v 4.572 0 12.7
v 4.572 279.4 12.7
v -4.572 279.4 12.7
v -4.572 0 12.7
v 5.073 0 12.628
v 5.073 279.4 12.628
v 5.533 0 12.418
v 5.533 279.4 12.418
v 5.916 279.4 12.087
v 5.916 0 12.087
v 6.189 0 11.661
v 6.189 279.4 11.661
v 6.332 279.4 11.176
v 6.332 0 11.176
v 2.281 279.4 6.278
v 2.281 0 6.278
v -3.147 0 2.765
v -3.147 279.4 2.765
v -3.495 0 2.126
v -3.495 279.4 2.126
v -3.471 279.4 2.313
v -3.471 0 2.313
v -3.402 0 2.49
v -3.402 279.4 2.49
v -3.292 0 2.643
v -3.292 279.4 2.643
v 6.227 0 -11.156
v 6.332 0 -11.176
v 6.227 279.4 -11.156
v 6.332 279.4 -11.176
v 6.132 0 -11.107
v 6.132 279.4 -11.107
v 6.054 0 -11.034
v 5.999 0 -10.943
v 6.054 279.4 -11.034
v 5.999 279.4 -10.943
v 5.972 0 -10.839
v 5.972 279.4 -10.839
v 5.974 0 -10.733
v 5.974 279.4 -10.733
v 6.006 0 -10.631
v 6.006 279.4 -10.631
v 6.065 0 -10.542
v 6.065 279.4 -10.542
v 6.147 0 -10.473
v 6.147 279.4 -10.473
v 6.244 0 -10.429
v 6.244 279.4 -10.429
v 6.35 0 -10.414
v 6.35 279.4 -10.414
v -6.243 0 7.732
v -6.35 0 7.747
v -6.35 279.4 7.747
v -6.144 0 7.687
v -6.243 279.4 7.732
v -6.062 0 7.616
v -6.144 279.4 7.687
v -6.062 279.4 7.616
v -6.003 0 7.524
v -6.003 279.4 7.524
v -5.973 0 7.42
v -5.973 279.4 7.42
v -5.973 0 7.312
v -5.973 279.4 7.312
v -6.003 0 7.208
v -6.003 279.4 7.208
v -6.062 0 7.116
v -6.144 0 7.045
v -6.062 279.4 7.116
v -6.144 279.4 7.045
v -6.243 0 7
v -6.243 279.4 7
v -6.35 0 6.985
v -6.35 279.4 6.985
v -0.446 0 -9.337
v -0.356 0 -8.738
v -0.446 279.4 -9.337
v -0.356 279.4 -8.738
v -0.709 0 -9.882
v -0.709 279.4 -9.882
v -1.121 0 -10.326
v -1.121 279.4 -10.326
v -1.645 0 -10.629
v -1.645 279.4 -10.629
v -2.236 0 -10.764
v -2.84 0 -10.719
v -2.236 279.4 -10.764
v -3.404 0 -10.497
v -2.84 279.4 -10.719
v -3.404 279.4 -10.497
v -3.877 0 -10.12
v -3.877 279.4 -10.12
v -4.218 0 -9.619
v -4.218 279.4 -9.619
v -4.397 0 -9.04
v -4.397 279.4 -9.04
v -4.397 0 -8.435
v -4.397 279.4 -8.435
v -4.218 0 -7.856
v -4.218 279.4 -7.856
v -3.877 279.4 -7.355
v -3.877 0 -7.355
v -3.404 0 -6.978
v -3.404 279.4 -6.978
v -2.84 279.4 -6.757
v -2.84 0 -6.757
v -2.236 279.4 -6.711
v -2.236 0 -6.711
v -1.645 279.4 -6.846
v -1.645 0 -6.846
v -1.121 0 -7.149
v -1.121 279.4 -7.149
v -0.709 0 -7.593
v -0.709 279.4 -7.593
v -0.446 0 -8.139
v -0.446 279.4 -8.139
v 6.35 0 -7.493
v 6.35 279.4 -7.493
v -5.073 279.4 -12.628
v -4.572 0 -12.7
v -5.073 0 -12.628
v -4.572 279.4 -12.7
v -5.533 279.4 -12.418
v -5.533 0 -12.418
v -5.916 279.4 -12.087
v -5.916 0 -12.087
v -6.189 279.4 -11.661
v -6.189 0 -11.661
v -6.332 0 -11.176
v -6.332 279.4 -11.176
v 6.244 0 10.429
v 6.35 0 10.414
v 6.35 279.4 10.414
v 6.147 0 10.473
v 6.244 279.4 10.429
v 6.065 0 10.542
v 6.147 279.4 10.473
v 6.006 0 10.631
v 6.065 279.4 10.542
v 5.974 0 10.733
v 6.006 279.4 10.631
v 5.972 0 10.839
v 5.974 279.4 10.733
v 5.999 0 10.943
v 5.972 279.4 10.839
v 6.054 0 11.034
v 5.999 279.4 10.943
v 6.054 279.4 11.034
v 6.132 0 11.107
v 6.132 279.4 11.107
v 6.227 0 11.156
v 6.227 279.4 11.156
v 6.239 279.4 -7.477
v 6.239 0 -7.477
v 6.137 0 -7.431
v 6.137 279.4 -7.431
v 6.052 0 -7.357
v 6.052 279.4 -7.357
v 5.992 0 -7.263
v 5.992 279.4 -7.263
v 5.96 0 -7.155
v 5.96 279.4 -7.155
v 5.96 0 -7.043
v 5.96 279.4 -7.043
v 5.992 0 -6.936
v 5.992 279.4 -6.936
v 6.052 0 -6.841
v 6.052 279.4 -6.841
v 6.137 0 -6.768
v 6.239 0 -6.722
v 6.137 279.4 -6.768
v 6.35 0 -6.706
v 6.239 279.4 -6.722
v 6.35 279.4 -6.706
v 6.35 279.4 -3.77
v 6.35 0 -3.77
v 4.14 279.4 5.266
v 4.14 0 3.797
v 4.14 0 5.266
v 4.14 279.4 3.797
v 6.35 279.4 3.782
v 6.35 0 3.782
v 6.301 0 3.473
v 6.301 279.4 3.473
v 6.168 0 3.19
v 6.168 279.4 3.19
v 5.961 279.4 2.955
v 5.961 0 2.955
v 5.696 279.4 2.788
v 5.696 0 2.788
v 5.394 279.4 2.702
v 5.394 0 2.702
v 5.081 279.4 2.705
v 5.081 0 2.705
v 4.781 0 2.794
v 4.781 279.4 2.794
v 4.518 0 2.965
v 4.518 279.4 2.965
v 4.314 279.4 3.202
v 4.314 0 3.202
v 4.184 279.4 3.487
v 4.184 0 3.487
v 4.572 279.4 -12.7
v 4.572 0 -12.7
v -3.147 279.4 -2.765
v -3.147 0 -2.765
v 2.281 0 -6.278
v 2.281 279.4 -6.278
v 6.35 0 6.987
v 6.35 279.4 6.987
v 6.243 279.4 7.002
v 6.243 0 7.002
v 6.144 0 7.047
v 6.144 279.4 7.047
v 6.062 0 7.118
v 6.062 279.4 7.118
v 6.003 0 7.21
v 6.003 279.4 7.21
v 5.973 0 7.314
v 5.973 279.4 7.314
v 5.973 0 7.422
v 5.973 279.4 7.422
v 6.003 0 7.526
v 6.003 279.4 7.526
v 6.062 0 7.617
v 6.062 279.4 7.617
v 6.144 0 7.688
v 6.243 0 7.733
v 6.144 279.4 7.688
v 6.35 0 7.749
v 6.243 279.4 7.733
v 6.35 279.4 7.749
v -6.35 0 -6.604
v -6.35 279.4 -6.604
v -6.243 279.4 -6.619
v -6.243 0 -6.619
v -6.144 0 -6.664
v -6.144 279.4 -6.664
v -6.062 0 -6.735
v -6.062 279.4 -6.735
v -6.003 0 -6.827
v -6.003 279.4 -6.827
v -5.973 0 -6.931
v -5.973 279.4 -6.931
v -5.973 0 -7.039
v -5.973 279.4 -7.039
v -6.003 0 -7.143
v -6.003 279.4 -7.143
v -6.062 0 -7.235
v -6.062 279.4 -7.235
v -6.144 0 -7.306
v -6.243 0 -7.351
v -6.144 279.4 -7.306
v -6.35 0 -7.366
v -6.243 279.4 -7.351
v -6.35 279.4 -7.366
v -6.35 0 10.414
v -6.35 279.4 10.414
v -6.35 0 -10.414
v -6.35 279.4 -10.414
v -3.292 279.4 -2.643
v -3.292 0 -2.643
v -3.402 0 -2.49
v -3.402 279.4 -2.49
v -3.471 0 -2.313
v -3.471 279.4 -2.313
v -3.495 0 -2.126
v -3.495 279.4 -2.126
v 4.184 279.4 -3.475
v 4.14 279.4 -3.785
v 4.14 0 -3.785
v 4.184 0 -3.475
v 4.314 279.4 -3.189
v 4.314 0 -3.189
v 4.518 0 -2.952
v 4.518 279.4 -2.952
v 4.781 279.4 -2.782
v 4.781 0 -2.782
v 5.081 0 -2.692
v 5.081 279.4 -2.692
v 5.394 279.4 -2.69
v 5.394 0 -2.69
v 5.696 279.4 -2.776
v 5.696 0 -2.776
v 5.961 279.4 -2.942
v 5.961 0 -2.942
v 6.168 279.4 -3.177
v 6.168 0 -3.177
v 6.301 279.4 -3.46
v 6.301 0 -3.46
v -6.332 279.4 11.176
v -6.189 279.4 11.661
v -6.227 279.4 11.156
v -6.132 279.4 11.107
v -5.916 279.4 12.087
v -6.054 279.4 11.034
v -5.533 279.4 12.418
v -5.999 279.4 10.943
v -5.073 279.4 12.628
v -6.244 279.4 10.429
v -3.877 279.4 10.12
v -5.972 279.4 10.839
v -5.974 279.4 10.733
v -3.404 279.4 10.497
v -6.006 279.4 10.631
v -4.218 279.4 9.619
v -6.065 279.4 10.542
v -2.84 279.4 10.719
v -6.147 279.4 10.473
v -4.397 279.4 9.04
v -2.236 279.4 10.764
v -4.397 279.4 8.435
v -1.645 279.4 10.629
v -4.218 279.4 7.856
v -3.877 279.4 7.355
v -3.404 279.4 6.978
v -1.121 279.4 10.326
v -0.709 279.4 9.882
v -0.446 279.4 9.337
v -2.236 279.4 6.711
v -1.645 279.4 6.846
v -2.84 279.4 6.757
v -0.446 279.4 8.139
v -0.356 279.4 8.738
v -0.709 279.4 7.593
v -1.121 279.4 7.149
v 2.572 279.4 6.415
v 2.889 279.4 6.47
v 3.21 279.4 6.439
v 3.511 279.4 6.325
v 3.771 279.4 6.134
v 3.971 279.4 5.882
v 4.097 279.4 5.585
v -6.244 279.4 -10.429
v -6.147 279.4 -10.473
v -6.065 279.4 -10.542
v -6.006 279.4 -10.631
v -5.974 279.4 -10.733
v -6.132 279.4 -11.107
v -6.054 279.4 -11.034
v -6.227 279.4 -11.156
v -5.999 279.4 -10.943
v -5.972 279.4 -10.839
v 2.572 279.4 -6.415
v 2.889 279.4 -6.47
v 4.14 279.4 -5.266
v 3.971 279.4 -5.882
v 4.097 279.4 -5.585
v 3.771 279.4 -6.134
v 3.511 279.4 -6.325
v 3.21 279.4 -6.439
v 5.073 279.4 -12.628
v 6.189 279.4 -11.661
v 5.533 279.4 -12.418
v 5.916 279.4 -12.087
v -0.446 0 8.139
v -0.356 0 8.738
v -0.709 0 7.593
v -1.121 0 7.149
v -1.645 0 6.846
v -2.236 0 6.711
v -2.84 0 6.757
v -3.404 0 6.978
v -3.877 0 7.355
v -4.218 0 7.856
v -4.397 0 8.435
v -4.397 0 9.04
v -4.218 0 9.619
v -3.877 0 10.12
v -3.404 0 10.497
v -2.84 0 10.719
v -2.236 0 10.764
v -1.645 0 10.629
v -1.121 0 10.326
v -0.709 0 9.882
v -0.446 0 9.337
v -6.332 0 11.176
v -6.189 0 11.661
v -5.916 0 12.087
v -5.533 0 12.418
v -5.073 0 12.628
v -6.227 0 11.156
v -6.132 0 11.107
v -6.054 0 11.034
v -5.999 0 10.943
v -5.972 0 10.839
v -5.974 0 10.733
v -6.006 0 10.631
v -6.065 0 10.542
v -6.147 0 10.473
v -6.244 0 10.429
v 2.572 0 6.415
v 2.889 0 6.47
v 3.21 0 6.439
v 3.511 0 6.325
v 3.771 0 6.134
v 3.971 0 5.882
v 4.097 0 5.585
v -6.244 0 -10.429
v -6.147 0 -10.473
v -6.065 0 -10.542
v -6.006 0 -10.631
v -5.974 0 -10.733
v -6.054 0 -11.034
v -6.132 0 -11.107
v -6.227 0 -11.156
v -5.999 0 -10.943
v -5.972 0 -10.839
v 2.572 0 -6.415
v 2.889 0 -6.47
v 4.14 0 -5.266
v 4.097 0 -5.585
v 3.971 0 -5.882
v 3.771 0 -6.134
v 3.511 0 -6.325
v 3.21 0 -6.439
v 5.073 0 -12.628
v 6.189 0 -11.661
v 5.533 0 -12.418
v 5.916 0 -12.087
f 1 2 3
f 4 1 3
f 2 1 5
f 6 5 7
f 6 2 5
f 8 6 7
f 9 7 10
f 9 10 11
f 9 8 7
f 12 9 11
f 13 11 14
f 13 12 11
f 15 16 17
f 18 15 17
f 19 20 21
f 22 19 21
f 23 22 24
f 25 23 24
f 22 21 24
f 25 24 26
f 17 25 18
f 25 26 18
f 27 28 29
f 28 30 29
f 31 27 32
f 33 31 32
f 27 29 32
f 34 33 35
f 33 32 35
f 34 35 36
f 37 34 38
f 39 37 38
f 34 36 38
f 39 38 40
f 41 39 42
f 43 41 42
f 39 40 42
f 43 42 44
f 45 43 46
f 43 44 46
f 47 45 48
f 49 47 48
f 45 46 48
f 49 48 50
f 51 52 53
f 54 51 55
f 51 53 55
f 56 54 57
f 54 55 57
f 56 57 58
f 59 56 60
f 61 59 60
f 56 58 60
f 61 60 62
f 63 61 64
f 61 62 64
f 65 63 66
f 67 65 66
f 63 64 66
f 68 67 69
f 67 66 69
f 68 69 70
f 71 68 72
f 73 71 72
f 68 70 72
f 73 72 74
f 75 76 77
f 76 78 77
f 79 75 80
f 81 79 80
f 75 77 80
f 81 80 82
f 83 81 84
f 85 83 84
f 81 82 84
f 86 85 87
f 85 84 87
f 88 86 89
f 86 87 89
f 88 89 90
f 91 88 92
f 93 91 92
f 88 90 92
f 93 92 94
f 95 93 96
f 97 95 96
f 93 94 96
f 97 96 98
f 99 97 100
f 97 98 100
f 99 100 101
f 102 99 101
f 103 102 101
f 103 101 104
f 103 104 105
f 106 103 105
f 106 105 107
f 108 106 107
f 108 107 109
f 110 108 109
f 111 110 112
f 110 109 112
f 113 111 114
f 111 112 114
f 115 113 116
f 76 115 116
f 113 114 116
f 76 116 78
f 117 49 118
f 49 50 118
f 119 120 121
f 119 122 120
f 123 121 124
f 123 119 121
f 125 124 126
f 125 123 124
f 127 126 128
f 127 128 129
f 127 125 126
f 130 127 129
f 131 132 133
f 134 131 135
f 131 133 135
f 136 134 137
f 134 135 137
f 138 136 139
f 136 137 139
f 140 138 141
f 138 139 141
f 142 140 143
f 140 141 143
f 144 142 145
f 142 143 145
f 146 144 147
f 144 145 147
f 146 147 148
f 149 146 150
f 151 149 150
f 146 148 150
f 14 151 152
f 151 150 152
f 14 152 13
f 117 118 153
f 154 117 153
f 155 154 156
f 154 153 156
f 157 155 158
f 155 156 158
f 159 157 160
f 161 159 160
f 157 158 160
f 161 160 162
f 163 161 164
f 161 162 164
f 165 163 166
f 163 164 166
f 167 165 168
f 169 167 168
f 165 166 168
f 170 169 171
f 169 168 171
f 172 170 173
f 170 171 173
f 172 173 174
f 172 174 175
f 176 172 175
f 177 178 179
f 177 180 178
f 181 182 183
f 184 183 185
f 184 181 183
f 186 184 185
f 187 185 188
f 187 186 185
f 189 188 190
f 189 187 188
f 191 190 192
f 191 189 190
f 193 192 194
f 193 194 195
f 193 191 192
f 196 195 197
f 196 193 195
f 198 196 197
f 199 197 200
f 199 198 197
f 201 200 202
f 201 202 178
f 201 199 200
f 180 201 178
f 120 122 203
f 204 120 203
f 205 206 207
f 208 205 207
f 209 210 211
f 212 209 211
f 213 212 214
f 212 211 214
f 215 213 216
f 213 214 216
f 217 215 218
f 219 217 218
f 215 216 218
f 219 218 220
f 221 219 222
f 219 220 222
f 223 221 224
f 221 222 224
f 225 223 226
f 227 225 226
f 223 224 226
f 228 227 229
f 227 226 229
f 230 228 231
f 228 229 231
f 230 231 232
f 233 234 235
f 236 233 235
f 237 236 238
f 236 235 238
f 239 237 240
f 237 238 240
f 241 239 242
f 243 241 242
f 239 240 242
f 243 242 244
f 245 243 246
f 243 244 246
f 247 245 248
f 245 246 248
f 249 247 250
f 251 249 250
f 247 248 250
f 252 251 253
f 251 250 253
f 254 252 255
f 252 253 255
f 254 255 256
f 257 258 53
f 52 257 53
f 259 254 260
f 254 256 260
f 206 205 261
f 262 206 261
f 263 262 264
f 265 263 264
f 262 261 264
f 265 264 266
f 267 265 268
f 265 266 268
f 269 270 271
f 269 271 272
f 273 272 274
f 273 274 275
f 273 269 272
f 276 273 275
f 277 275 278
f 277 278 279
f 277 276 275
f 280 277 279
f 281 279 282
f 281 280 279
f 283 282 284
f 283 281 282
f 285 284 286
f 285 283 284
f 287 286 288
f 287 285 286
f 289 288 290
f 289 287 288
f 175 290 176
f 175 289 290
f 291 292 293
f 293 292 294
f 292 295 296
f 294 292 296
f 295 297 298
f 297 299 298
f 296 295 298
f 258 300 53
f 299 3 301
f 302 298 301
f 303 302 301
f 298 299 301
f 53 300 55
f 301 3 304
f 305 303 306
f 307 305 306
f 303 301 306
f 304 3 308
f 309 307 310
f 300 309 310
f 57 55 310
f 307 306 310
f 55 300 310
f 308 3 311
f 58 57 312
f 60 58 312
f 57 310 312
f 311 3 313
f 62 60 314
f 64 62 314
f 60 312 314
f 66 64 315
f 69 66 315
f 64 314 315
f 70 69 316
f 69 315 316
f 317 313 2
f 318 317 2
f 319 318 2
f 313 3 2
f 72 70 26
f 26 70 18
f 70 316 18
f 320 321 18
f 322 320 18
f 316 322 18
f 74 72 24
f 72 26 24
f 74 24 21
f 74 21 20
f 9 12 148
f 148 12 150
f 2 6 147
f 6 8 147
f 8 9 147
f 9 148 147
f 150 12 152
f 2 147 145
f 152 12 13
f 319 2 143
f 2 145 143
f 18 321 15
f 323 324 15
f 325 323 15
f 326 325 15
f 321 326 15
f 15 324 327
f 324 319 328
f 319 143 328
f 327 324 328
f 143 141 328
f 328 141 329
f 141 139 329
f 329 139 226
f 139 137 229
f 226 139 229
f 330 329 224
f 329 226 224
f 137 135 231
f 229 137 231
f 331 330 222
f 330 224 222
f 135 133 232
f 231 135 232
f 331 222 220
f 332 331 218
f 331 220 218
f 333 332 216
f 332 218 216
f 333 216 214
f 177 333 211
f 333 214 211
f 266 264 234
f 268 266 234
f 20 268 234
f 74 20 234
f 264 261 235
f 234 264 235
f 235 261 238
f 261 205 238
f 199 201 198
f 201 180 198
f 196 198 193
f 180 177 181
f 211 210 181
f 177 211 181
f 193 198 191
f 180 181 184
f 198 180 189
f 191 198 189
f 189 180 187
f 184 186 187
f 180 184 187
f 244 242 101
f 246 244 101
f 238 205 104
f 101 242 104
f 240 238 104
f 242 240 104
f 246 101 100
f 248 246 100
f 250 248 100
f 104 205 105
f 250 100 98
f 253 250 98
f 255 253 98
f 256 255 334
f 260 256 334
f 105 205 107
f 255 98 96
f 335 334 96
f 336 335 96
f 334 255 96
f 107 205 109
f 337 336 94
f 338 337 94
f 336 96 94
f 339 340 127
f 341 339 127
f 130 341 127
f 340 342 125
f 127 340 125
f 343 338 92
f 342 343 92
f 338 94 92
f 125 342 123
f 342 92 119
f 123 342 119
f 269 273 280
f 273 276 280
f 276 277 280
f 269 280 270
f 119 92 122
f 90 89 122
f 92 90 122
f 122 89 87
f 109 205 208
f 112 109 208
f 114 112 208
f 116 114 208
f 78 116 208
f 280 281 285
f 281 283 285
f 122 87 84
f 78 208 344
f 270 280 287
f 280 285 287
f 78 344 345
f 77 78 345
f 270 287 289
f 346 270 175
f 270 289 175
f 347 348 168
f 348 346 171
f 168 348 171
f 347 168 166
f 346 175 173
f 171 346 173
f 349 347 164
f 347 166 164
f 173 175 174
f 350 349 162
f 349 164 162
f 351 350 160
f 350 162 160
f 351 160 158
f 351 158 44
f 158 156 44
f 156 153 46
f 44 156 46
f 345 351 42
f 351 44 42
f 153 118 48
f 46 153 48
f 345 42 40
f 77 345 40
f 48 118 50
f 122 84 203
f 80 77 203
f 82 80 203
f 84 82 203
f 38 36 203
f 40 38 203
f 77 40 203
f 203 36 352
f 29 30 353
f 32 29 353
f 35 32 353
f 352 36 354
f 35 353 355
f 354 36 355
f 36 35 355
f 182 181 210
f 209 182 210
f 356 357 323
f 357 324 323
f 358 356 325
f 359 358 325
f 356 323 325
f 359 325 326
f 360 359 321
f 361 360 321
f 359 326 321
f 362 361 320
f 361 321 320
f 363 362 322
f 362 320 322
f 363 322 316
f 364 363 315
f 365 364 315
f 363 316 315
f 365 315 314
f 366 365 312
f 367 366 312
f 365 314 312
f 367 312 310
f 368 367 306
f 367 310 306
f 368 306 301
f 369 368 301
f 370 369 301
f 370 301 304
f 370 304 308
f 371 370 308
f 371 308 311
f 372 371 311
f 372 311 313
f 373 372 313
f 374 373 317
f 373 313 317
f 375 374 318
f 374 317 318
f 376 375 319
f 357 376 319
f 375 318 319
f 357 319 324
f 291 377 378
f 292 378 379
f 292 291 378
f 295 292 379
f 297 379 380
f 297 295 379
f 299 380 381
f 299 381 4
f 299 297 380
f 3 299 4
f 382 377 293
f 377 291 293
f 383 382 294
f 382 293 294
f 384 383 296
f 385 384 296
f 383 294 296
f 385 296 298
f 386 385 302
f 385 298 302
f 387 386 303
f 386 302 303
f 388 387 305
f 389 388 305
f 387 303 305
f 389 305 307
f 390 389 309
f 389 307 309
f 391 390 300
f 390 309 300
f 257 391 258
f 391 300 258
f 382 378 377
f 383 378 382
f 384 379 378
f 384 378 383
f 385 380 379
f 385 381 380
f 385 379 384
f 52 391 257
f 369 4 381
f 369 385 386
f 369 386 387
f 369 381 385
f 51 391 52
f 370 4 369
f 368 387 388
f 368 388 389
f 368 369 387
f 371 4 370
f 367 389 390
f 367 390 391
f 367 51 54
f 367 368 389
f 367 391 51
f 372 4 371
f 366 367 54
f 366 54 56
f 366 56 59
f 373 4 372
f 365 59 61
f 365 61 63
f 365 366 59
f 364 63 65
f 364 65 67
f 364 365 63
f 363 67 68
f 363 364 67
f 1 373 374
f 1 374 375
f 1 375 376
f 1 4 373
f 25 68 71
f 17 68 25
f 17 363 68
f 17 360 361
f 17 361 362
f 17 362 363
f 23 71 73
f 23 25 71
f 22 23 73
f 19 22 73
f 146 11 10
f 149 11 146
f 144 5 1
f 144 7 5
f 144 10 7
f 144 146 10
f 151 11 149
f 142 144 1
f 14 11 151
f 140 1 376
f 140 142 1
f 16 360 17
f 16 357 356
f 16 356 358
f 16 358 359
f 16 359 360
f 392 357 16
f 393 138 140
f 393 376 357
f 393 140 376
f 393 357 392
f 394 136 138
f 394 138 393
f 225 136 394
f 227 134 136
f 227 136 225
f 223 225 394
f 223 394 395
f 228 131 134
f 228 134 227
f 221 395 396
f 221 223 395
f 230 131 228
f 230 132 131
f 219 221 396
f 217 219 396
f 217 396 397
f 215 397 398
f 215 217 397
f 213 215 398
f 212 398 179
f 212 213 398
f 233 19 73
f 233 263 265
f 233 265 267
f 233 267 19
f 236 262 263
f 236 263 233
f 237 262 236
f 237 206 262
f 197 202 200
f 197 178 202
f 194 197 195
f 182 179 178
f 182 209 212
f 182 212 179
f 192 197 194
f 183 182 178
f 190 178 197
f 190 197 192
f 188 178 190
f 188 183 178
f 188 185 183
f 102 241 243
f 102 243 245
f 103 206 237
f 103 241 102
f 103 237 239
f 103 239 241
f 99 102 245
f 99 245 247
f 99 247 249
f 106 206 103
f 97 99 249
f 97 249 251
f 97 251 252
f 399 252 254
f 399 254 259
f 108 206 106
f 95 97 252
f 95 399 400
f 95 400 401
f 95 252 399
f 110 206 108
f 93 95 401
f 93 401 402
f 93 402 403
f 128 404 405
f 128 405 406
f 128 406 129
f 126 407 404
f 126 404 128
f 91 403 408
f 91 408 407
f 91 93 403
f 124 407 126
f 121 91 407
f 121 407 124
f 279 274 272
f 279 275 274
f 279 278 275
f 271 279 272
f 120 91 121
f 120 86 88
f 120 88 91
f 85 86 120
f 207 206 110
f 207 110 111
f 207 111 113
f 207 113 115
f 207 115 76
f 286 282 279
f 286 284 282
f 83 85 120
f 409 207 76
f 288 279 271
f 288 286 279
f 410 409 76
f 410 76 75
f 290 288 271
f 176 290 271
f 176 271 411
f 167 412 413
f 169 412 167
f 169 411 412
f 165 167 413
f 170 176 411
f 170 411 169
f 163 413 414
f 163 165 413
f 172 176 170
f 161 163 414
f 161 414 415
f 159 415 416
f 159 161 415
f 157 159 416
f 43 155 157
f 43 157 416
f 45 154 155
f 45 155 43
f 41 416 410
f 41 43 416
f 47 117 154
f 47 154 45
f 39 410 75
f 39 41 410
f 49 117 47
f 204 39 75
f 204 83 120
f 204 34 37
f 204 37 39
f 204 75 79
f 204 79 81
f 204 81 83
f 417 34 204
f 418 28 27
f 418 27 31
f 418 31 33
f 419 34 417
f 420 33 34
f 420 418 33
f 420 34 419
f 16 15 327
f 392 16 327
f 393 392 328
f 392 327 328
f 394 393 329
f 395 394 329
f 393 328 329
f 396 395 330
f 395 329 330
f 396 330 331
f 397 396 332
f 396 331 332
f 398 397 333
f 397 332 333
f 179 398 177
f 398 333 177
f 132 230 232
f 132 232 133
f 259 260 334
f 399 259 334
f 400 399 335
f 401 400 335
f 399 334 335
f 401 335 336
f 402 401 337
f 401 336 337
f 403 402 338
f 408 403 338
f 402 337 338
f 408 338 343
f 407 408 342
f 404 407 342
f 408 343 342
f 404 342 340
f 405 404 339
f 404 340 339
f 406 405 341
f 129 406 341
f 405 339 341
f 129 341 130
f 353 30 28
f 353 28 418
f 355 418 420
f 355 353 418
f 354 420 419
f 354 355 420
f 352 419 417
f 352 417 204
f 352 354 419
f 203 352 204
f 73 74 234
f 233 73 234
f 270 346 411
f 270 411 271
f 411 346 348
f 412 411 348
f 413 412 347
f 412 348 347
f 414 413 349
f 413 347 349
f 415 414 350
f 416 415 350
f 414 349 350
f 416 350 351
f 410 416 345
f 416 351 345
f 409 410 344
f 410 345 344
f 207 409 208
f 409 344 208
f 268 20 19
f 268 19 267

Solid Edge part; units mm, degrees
sketch "Sketch1" plane through (0, 0, 0) normal (0, 0, 1) x (1, 0, 0)
  line L0 (0, 0) -> (0, 279.4)
  dimension "D1" = 279.4
sketch "Sketch2" plane through (0, 0, 0) normal (0, -1, 0) x (1, 0, 0)
  line L0 (4.572, 12.7) -> (-4.572, 12.7)
  arc A0 (-4.572, 12.7) -> (-6.35, 10.922) centre (-4.572, 10.922) ccw
  line L1 (-6.35, 10.922) -> (-6.35, -10.922)
  arc A1 (-4.572, -12.7) -> (-6.35, -10.922) centre (-4.572, -10.922) cw
  line L2 (-4.572, -12.7) -> (4.572, -12.7)
  arc A2 (4.572, -12.7) -> (6.35, -10.922) centre (4.572, -10.922) ccw
  line L3 (6.35, -10.922) -> (6.35, 10.922)
  arc A3 (6.35, 10.922) -> (4.572, 12.7) centre (4.572, 10.922) ccw
  dimension "D1" = 12.7
  dimension "D2" = 6.35
  dimension "D3" = 12.7
  dimension "D4" = 25.4
  dimension "D5" = 1.778
sweep "SweptProtrusion1" add profiles "Sketch2" path "Sketch1"
sketch "Sketch3" plane through (0, 0, 0) normal (0, 0, 1) x (1, 0, 0)
  line L0 (0, 0) -> (0, 279.4)
  dimension "D1" = 279.4
sketch "Sketch4" plane through (-6.35, 0, 6.35) normal (0, -1, 0) x (1, 0, 0)
  circle A0 centre (3.9624, 2.3876) radius 2.032
  dimension "D1" = 4.0639
  dimension "D2" = 3.9624
  dimension "D3" = 17.4752
  dimension "D4" = 12.7
sweep "SweptCutout1" cut profiles "Sketch4" path "Sketch3"
sketch "Sketch5" plane through (0, 0, 0) normal (0, 0, 1) x (1, 0, 0)
  line L0 (0, 0) -> (0, 279.4)
  dimension "D1" = 279.4
sketch "Sketch6" plane through (-6.35, 0, 6.35) normal (0, -1, 0) x (1, 0, 0)
  circle A0 centre (3.9624, -15.0876) radius 2.032
  dimension "D1" = 4.0639
  dimension "D2" = 3.9624
  dimension "D3" = 17.4752
  dimension "D4" = 12.7
sweep "SweptCutout2" cut profiles "Sketch6" path "Sketch5"
sketch "Sketch7" plane through (0, 0, 0) normal (0, 0, 1) x (1, 0, 0)
  line L0 (0, 0) -> (0, 279.4)
  dimension "D1" = 279.4
sketch "Sketch8" plane through (0, 0, 0) normal (0, -1, 0) x (1, 0, 0)
  line L0 (4.1402, 3.7973) -> (4.1402, 5.2661)
  arc A0 (4.1402, 5.2661) -> (2.2806, 6.2777) centre (2.9353, 5.2661) ccw
  line L1 (-3.147, 2.7652) -> (2.2806, 6.2777)
  arc A1 (-3.495, 2.1255) -> (-3.147, 2.7652) centre (-2.733, 2.1255) cw
  line L2 (-3.495, 2.1255) -> (-3.495, -2.1255)
  arc A2 (-3.495, -2.1255) -> (-3.147, -2.7652) centre (-2.733, -2.1255) ccw
  line L3 (-3.147, -2.7652) -> (2.2806, -6.2777)
  arc A3 (4.1402, -5.2661) -> (2.2806, -6.2777) centre (2.9353, -5.2661) cw
  line L4 (4.1402, -3.7846) -> (4.1402, -5.2661)
  line L5 (6.35, 3.7973) -> (6.35, -3.7846)
  arc A4 (4.1402, -3.7846) -> (6.35, -3.7846) centre (5.2451, -3.7846) cw
  arc A5 (6.35, 3.7973) -> (4.1402, 3.7973) centre (5.2451, 3.7973) cw
sweep "SweptCutout3" cut profiles "Sketch8" path "Sketch7"
sketch "Sketch9" plane through (0, 0, 0) normal (0, 0, 1) x (1, 0, 0)
  line L0 (0, 0) -> (0, 279.4)
  dimension "D1" = 279.4
sketch "Sketch10" plane through (0, 0, 0) normal (0, -1, 0) x (-1, 0, 0)
  circle A0 centre (6.35, -10.795) radius 0.381
  dimension "D1" = 0.762
  dimension "D2" = 1.905
sweep "SweptCutout4" cut profiles "Sketch10" path "Sketch9"
sketch "Sketch11" plane through (0, 0, 0) normal (0, 0, 1) x (1, 0, 0)
  line L0 (0, 0) -> (0, 279.4)
  dimension "D1" = 279.4
sketch "Sketch12" plane through (0, 0, 0) normal (0, -1, 0) x (0, 0, 1)
  circle A0 centre (7.366, 6.35) radius 0.381
  dimension "D1" = 0.762
sweep "SweptCutout5" cut profiles "Sketch12" path "Sketch11"
sketch "Sketch13" plane through (0, 0, 0) normal (0, 0, 1) x (1, 0, 0)
  line L0 (0, 0) -> (0, 279.4)
  dimension "D1" = 279.4
sketch "Sketch14" plane through (0, 0, 0) normal (0, -1, 0) x (-1, 0, 0)
  circle A0 centre (-6.35, -10.795) radius 0.381
  dimension "D1" = 0.762
  dimension "D2" = 1.905
sweep "SweptCutout6" cut profiles "Sketch14" path "Sketch13"
sketch "Sketch15" plane through (0, 0, 0) normal (0, 0, 1) x (1, 0, 0)
  line L0 (0, 0) -> (0, 279.4)
  dimension "D1" = 279.4
sketch "Sketch16" plane through (0, 0, 0) normal (0, -1, 0) x (0, 0, 1)
  circle A0 centre (7.3678, -6.35) radius 0.381
  dimension "D1" = 0.762
sweep "SweptCutout7" cut profiles "Sketch16" path "Sketch15"
sketch "Sketch17" plane through (0, 0, 0) normal (0, 0, 1) x (1, 0, 0)
  line L0 (0, 0) -> (0, 279.4)
  dimension "D1" = 279.4
sketch "Sketch18" plane through (0, 0, 0) normal (0, -1, 0) x (0, 0, -1)
  circle A0 centre (10.795, -6.35) radius 0.381
  dimension "D1" = 0.762
  dimension "D2" = 1.905
sweep "SweptCutout8" cut profiles "Sketch18" path "Sketch17"
sketch "Sketch19" plane through (0, 0, 0) normal (0, 0, 1) x (1, 0, 0)
  line L0 (0, 0) -> (0, 279.4)
  dimension "D1" = 279.4
sketch "Sketch20" plane through (0.0001, 0, 0) normal (0, -1, 0) x (0, 0, -1)
  circle A0 centre (6.985, -6.3501) radius 0.381
  dimension "D1" = 0.762
  dimension "D2" = 3.81
sweep "SweptCutout9" cut profiles "Sketch20" path "Sketch19"
sketch "Sketch21" plane through (0, 0, 0) normal (0, 0, 1) x (1, 0, 0)
  line L0 (0, 0) -> (0, 279.4)
  dimension "D1" = 279.4
sketch "Sketch22" plane through (0.0001, 0, 0) normal (0, -1, 0) x (0, 0, -1)
  circle A0 centre (10.795, 6.3499) radius 0.381
  dimension "D1" = 0.762
  dimension "D2" = 1.905
sweep "SweptCutout10" cut profiles "Sketch22" path "Sketch21"
sketch "Sketch23" plane through (0, 0, 0) normal (0, 0, 1) x (1, 0, 0)
  line L0 (0, 0) -> (0, 279.4)
  dimension "D1" = 279.4
sketch "Sketch24" plane through (0.0001, 0, 0) normal (0, -1, 0) x (0, 0, 1)
  circle A0 centre (-7.0993, -6.3499) radius 0.3937
  dimension "D1" = 0.7873
  dimension "D2" = 3.6957
sweep "SweptCutout11" cut profiles "Sketch24" path "Sketch23"
